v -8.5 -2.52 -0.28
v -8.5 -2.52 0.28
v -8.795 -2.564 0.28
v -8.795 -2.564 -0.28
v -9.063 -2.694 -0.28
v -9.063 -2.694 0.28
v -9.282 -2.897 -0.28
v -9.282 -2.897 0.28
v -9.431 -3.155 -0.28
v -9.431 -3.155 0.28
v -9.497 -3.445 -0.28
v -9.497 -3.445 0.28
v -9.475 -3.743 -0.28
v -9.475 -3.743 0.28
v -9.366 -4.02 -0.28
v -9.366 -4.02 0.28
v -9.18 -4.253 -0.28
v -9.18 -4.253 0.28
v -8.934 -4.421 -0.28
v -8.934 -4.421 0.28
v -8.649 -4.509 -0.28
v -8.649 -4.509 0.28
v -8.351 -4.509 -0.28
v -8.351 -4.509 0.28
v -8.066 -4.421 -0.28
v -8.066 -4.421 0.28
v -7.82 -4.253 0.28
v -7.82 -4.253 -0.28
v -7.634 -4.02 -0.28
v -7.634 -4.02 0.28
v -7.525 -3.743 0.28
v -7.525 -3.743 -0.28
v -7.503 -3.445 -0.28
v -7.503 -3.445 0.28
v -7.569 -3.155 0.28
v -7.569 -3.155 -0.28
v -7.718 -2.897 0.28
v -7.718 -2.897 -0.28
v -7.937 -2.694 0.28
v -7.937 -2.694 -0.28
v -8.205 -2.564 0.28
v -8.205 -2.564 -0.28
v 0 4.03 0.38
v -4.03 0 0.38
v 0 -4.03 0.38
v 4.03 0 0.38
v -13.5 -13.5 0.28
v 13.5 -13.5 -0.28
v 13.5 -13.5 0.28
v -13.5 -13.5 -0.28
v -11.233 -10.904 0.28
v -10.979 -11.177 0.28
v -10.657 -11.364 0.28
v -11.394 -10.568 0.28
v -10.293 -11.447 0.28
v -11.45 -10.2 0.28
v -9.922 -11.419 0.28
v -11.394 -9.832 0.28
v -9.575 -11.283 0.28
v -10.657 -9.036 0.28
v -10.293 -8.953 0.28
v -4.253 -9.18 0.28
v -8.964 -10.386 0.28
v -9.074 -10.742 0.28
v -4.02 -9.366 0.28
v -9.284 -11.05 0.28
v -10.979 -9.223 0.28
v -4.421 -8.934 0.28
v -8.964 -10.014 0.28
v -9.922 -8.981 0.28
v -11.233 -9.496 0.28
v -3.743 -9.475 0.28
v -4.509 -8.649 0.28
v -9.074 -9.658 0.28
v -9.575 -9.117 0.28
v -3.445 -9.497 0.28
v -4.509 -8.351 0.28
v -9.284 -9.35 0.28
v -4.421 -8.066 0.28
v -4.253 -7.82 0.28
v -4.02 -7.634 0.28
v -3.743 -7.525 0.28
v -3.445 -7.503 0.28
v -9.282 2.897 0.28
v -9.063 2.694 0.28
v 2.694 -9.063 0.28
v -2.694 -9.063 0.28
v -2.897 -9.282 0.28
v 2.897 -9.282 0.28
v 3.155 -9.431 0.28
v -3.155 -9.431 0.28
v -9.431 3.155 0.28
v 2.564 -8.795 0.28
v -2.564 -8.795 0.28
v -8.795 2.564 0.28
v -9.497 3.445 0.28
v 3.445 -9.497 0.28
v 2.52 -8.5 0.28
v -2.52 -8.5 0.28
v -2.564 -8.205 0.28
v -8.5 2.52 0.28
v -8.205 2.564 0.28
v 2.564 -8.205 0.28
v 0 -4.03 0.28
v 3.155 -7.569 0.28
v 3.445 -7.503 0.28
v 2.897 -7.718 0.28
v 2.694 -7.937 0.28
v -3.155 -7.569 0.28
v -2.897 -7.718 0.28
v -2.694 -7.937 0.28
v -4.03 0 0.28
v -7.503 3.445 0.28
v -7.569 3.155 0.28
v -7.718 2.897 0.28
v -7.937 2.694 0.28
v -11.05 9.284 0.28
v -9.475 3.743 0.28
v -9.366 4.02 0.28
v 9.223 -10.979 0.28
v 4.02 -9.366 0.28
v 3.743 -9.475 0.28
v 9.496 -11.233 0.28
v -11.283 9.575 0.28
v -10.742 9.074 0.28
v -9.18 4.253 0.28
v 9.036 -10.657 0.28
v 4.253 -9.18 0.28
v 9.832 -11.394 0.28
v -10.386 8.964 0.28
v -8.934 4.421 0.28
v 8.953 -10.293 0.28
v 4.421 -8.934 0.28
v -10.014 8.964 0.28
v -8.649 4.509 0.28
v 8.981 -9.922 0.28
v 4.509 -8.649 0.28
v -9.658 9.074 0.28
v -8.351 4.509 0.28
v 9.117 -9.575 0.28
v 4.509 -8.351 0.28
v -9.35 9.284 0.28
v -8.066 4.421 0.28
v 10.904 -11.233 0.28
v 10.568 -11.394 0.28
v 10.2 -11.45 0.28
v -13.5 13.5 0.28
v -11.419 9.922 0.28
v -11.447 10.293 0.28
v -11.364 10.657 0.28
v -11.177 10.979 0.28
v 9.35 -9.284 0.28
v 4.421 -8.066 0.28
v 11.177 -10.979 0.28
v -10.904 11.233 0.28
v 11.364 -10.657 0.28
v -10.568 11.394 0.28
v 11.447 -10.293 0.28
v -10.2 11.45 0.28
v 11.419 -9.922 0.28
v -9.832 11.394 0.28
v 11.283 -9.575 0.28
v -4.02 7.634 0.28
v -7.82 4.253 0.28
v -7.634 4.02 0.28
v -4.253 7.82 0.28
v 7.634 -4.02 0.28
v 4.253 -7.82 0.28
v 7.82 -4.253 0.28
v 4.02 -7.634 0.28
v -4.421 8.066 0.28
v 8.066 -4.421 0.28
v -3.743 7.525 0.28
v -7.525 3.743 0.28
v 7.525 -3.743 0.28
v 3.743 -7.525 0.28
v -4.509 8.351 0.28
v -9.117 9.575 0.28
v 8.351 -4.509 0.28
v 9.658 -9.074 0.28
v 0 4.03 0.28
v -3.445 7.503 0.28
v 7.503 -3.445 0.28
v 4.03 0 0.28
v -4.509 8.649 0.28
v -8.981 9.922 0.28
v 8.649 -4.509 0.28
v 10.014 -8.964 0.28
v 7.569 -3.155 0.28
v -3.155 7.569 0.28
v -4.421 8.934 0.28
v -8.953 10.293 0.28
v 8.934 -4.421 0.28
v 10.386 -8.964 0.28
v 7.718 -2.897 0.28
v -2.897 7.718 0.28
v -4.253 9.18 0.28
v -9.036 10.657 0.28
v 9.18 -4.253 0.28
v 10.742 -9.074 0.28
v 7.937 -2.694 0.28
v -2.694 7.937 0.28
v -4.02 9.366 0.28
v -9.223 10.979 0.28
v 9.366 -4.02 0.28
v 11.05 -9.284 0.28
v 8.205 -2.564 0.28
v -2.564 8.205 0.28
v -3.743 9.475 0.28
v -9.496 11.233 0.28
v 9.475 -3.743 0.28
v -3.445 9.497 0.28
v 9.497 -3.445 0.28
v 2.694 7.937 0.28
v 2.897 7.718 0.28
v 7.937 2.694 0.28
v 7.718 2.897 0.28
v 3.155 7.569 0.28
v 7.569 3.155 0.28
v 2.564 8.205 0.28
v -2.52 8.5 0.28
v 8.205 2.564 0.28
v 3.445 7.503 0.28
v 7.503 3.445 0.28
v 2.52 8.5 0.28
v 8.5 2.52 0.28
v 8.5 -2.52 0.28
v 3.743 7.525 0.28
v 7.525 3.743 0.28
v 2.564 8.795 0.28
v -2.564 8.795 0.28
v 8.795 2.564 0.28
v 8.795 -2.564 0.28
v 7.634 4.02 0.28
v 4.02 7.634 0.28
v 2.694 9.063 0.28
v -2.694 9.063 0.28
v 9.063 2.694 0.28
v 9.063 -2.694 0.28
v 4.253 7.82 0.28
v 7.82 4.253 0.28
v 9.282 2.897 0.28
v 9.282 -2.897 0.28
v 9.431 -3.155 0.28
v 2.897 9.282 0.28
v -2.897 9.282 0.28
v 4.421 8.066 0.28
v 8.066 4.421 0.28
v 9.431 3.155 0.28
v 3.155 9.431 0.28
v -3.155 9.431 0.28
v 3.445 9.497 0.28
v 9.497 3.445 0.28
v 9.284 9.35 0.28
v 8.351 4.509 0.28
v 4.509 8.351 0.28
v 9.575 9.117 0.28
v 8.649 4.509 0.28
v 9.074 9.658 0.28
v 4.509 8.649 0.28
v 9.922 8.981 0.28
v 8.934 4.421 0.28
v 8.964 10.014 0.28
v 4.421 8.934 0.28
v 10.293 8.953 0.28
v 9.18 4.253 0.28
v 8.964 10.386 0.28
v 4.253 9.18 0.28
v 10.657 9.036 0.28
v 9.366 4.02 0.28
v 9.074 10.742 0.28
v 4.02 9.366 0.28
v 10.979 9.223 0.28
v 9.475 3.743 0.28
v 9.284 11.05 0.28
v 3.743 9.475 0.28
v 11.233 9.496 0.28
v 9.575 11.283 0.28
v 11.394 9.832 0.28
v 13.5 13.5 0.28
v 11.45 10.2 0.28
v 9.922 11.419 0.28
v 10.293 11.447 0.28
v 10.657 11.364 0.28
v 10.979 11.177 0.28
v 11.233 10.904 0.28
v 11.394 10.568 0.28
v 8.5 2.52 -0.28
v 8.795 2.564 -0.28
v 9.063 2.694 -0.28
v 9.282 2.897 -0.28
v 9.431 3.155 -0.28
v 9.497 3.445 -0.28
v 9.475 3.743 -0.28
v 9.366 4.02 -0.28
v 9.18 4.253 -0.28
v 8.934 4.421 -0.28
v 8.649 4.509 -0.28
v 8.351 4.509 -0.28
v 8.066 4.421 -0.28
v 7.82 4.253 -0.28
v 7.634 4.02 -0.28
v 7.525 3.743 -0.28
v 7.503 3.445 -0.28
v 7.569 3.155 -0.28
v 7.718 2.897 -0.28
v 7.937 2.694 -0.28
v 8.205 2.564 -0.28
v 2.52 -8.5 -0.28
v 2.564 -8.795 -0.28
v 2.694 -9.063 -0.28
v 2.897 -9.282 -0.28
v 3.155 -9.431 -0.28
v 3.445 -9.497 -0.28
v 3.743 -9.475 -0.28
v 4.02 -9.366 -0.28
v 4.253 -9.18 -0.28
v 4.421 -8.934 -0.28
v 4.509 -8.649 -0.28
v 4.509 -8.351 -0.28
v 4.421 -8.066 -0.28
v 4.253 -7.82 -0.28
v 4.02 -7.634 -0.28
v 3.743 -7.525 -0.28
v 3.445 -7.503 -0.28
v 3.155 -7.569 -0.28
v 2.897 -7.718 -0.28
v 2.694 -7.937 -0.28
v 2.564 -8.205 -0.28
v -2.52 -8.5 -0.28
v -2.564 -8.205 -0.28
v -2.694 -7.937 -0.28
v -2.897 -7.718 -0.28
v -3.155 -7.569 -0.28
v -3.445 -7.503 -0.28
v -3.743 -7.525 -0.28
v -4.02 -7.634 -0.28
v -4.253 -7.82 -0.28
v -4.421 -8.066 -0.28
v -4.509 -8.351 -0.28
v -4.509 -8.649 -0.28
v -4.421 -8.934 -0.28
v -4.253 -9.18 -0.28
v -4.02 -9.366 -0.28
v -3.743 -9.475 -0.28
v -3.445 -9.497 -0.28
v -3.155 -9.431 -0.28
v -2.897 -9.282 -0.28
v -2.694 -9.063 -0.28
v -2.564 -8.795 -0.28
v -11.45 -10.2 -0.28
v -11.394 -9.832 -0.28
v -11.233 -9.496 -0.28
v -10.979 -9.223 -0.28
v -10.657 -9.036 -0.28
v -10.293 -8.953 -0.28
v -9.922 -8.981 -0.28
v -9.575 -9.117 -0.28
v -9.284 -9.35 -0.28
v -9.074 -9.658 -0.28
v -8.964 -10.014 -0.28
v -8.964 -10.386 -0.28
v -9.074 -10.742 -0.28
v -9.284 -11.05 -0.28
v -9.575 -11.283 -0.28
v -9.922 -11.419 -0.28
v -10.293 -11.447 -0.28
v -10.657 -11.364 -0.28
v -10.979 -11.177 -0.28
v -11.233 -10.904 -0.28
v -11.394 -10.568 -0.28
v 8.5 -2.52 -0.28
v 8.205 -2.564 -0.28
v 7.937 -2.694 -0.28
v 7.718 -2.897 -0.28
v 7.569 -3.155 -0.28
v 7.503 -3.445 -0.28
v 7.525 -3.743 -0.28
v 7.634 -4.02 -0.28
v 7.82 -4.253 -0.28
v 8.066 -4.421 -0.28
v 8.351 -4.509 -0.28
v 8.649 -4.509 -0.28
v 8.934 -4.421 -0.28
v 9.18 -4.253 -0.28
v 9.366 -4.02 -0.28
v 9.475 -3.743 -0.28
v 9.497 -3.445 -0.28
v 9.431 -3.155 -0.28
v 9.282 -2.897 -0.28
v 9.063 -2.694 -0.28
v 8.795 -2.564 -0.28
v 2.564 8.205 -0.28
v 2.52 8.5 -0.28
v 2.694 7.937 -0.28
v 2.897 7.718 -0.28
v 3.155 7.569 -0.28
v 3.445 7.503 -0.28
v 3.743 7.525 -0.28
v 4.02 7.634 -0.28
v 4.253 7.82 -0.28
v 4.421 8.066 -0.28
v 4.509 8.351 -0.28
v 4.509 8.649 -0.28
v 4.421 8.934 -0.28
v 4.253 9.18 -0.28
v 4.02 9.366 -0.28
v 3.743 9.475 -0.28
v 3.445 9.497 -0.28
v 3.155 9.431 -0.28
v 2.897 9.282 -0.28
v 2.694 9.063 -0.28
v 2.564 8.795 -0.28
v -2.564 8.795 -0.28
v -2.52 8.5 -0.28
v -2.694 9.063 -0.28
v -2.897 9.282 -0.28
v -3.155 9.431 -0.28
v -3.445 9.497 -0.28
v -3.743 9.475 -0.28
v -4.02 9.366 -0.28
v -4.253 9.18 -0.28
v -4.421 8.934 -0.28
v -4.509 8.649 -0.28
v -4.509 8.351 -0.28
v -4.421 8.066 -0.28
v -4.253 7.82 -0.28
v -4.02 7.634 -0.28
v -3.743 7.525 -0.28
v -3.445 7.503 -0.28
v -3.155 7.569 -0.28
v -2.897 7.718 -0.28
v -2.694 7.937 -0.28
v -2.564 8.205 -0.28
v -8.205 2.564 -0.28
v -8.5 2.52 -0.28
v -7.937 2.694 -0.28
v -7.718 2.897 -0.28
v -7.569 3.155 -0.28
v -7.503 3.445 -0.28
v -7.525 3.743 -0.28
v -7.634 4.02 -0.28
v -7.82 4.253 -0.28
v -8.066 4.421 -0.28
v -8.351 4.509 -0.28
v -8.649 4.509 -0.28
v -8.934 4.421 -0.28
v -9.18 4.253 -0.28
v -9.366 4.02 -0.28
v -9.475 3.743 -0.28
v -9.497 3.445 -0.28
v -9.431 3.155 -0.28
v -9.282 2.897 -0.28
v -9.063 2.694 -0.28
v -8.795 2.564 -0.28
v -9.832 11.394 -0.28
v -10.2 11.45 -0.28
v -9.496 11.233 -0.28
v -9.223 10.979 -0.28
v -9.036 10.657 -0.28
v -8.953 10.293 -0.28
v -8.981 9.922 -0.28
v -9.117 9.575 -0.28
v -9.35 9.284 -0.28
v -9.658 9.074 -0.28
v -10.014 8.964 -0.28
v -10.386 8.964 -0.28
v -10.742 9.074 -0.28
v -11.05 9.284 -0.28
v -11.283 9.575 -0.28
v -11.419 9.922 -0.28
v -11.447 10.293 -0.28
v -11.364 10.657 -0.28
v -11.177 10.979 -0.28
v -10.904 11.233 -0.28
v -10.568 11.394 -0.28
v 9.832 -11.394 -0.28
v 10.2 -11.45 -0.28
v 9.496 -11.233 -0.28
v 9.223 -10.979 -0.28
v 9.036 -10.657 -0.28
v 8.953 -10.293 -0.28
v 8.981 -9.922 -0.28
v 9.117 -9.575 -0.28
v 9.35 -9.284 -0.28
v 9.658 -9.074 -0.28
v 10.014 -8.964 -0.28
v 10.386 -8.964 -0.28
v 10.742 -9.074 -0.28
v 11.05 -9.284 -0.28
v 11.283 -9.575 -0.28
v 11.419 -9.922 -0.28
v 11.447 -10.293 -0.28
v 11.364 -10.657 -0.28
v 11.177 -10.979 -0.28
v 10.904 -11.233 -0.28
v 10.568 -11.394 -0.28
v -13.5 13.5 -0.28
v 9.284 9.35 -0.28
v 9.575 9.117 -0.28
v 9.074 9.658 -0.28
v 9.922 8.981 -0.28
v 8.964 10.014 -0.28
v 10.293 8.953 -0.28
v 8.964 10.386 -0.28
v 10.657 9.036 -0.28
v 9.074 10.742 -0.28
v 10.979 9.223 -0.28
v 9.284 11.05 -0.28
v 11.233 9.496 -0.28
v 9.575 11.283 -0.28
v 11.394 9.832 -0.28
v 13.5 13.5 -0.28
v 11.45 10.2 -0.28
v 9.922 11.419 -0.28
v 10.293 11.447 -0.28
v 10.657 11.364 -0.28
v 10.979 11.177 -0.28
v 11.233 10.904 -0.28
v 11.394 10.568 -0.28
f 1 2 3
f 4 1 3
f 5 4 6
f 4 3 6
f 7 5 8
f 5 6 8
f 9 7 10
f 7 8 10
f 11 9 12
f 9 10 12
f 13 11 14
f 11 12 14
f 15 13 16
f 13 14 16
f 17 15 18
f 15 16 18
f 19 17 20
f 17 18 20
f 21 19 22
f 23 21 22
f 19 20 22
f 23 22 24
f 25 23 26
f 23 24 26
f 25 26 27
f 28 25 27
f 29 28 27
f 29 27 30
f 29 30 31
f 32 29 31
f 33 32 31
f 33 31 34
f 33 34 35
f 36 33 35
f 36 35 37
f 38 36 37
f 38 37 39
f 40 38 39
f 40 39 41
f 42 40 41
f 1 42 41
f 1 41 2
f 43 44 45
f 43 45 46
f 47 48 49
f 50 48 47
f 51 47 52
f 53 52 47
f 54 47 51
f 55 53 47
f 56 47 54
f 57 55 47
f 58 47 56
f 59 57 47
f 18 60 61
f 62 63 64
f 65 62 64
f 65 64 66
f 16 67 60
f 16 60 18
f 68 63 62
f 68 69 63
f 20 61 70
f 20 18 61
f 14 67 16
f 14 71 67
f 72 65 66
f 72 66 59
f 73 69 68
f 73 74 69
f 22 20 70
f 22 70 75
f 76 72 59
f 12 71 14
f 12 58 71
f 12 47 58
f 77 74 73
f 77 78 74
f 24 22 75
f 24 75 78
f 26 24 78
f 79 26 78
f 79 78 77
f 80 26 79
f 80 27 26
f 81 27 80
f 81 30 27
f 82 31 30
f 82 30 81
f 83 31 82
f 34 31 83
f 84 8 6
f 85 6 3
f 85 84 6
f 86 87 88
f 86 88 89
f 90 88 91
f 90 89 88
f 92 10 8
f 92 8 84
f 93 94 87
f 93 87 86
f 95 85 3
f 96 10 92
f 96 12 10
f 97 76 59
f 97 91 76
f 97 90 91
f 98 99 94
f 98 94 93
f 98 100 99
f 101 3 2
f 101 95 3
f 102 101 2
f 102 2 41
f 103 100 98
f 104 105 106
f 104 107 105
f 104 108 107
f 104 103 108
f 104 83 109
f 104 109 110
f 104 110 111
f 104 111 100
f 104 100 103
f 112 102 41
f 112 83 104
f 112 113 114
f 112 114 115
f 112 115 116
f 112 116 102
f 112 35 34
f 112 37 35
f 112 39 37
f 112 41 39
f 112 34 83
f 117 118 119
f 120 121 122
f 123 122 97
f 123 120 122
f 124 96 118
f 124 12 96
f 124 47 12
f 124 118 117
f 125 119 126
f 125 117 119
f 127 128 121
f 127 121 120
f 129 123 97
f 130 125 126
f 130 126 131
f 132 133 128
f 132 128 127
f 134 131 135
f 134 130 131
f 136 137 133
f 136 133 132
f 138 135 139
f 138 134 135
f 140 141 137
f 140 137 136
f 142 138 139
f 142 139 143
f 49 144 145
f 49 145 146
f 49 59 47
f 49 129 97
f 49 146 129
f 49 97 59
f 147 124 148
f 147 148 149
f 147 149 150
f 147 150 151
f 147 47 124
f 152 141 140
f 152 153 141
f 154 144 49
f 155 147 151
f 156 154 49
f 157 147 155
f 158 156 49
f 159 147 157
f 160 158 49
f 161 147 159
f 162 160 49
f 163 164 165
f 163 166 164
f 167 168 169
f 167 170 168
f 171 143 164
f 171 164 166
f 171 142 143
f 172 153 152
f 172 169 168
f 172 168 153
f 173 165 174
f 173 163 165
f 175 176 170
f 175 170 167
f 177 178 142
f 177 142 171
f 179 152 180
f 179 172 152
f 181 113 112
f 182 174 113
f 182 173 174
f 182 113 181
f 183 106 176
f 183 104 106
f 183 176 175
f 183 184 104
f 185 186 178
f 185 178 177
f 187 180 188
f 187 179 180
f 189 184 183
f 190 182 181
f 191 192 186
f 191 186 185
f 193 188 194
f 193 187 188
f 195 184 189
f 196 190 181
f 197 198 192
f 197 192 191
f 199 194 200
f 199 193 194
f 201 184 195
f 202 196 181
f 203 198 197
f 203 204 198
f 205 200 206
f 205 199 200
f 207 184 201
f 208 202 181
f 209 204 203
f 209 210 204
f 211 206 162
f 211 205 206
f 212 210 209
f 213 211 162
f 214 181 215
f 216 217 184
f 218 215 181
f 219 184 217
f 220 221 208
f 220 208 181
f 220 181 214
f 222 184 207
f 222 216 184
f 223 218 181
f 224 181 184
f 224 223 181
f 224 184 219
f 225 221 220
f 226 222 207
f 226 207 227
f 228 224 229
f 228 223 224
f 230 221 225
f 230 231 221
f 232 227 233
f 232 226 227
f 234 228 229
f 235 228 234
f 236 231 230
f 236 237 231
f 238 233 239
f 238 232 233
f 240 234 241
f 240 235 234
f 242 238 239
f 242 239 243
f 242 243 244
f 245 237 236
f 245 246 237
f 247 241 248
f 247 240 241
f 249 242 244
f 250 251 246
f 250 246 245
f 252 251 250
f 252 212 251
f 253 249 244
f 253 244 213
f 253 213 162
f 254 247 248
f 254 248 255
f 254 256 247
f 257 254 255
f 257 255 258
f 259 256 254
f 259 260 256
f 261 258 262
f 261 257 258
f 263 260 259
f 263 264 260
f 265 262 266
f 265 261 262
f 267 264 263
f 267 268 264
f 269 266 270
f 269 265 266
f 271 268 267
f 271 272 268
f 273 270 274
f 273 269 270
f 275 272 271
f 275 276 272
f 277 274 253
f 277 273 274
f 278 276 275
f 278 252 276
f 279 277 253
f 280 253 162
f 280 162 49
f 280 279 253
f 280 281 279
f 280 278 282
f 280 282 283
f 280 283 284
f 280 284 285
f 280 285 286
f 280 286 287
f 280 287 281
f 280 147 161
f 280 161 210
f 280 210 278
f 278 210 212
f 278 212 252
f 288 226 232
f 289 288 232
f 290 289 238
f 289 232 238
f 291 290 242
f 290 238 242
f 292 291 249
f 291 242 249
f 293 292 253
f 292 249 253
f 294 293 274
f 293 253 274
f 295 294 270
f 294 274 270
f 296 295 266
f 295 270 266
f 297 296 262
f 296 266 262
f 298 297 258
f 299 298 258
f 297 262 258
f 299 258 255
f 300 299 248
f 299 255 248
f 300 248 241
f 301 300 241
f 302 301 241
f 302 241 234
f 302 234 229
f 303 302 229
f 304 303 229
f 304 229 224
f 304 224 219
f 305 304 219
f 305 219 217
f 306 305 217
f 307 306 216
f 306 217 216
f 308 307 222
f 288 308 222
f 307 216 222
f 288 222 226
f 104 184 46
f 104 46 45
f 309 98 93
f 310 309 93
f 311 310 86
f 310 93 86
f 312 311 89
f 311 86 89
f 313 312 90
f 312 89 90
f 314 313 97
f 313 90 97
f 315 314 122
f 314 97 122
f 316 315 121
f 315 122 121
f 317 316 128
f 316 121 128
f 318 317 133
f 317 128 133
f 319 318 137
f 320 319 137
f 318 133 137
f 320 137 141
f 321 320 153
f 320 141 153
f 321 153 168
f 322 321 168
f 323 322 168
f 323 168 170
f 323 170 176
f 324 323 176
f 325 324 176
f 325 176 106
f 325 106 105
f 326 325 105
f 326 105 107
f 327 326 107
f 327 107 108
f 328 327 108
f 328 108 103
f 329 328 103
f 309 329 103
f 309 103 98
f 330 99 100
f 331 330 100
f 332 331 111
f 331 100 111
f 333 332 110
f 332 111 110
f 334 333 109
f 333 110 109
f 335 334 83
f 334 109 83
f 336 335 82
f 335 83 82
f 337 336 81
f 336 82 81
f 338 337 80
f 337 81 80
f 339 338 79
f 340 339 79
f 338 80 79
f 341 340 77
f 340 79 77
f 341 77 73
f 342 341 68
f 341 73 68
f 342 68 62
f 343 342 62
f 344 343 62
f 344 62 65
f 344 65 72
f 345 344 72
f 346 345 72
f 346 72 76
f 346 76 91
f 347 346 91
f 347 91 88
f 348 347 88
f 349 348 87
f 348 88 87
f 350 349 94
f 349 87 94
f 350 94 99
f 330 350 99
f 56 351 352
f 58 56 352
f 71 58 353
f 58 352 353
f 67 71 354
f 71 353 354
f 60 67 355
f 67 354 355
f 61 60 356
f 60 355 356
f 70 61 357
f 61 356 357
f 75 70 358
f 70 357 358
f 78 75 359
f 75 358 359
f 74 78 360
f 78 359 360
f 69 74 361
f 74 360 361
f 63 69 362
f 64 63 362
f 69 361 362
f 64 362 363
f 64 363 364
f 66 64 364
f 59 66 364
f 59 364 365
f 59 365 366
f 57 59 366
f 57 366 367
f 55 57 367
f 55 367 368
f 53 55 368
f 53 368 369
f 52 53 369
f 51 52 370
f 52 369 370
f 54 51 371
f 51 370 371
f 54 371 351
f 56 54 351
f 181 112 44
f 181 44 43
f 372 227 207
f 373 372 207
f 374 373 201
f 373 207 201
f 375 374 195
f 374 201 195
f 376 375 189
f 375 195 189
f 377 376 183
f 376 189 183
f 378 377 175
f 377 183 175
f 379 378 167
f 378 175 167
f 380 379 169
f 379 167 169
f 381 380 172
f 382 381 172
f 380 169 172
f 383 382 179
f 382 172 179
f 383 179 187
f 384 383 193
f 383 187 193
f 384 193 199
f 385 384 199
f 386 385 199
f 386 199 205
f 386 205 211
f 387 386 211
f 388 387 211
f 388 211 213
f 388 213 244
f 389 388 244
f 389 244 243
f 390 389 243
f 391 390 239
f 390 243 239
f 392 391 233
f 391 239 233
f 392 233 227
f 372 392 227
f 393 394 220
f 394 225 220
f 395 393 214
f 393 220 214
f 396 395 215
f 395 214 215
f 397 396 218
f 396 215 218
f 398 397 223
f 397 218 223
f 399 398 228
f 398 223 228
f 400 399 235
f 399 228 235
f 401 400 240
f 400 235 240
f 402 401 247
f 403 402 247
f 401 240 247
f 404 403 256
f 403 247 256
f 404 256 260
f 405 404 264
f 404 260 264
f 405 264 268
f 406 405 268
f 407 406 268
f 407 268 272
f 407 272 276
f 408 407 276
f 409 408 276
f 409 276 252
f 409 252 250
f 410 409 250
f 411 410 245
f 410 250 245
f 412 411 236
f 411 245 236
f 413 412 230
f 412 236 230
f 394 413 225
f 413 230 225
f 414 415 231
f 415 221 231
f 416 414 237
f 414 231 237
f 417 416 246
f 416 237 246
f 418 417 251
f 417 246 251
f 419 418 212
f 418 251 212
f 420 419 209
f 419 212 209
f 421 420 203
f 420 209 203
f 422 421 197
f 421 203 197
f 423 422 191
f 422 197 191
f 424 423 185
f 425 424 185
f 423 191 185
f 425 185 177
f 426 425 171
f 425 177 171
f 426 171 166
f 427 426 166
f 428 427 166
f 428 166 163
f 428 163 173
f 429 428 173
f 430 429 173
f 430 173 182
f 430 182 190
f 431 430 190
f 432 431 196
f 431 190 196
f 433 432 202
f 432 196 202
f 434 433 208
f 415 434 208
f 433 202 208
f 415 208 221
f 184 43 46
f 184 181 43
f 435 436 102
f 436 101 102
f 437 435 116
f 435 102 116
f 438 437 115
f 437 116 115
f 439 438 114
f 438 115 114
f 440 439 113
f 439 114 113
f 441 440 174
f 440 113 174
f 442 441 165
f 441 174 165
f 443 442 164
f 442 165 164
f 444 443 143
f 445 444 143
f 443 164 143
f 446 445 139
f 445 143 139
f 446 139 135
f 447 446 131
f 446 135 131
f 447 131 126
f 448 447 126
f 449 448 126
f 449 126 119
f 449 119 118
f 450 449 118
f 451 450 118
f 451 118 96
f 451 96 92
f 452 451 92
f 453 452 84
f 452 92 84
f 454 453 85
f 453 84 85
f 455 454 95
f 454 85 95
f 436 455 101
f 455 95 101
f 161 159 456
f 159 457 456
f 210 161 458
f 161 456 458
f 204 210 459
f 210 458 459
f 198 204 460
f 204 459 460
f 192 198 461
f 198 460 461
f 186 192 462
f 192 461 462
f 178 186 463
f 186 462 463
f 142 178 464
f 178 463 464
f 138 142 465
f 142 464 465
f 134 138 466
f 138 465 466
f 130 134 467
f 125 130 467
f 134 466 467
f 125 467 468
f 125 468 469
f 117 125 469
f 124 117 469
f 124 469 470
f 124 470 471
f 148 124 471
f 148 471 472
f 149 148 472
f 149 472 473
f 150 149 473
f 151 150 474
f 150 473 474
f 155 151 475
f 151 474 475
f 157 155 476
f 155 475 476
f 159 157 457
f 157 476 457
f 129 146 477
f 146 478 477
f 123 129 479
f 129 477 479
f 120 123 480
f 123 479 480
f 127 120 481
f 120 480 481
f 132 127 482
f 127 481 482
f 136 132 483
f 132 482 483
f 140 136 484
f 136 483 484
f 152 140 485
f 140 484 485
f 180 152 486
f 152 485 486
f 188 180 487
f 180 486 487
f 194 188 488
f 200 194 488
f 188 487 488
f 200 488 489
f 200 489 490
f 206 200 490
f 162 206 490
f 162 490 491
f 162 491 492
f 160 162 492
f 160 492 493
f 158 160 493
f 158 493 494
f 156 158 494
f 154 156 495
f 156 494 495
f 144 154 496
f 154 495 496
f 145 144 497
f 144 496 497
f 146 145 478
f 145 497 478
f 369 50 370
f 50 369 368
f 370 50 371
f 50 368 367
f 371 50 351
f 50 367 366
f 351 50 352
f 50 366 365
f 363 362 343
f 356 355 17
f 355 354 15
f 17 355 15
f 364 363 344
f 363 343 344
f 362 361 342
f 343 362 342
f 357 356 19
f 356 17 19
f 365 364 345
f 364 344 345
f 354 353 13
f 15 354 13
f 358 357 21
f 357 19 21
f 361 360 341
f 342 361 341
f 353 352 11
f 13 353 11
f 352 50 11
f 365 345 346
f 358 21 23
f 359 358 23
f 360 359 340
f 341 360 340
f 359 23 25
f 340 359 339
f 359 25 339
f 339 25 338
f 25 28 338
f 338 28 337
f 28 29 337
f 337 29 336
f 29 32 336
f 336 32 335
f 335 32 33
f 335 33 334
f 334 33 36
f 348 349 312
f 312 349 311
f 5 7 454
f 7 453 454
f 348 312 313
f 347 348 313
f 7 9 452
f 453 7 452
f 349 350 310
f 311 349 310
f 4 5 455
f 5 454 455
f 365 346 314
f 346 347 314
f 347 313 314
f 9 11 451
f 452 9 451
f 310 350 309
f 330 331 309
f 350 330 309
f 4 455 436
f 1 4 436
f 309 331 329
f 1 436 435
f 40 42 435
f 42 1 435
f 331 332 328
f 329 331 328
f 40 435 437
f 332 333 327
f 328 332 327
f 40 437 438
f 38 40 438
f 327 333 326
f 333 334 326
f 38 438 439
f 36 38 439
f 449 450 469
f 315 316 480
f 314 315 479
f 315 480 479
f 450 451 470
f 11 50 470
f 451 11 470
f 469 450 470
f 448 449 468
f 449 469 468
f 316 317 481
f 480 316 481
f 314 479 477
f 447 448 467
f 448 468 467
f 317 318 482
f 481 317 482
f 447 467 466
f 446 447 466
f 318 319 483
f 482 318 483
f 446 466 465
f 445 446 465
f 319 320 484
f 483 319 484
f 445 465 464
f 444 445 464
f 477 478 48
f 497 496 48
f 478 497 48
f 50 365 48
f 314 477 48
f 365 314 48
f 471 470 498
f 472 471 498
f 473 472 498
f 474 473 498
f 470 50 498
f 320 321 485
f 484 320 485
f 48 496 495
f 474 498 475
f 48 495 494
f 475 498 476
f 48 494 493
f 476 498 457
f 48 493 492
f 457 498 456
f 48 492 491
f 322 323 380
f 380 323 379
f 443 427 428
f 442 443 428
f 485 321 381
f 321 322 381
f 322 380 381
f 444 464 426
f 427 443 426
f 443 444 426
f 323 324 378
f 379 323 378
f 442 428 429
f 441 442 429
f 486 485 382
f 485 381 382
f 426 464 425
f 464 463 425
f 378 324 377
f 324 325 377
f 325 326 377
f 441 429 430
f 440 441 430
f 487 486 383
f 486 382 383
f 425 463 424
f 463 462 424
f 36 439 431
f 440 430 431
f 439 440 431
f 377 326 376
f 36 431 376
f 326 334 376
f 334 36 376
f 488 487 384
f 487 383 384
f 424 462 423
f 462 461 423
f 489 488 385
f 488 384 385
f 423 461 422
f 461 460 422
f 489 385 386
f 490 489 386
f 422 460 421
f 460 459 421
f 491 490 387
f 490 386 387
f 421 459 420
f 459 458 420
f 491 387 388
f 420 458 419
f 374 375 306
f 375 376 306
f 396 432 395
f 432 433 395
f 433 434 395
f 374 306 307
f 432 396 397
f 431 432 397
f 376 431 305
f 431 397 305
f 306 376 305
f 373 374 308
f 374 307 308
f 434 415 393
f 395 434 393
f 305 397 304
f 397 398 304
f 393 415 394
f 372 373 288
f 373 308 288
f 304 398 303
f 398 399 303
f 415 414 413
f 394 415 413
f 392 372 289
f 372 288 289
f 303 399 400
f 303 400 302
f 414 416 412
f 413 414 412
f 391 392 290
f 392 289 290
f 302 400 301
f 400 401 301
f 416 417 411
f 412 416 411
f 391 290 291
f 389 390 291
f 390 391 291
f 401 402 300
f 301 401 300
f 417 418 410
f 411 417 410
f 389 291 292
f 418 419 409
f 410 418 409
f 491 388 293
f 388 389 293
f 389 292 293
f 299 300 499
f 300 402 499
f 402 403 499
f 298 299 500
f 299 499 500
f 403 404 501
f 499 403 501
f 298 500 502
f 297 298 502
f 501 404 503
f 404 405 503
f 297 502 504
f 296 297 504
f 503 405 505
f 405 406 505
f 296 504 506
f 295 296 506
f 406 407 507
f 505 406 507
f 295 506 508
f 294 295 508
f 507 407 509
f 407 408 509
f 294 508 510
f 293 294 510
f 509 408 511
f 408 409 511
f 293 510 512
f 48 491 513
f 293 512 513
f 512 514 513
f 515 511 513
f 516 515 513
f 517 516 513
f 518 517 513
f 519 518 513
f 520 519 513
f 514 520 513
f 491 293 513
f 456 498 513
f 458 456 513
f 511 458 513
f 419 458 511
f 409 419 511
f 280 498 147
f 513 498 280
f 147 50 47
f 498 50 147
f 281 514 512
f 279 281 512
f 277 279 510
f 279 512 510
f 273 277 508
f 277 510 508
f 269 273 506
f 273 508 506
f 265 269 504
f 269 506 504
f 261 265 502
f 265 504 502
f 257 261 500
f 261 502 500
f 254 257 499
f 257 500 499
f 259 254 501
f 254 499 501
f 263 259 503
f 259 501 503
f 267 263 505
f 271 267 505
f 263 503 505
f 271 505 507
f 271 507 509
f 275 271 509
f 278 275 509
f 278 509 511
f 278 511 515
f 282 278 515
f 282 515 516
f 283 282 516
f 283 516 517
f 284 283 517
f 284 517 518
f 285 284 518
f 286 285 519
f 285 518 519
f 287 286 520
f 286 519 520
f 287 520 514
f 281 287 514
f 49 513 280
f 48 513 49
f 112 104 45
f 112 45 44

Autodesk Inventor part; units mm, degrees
ref_plane "YZ Plane" through (0, 0, 0) normal (1, 0, 0) x (0, 1, 0)
ref_plane "XZ Plane" through (0, 0, 0) normal (0, 1, 0) x (-1, 0, 0)
ref_plane "XY Plane" through (0, 0, 0) normal (0, 0, 1) x (1, 0, 0)
sketch "Sketch1" plane through (0, 0, 0) normal (0, 0, 1) x (1, 0, 0)
  line L0 (13.5, -13.5) -> (-13.5, -13.5)
  line L1 (-13.5, -13.5) -> (-13.5, 13.5)
  line L2 (-13.5, 13.5) -> (13.5, 13.5)
  line L3 (13.5, 13.5) -> (13.5, -13.5)
  line L4 (13.5, -13.5) -> (-13.5, 13.5) construction
  line L5 (-13.5, -13.5) -> (13.5, 13.5) construction
  point P0 (0, 0)
  dimension "d0" = 27
extrude "Extrusion1" add sketch "Sketch1" along normal mid plane 0.56
sketch "Sketch2" plane through (0, 0, 0.28) normal (0, 0, 1) x (1, 0, 0)
  line L0 (-13.5, -13.5) -> (13.5, -13.5) projected
  line L1 (13.5, -13.5) -> (13.5, 13.5) projected
  line L2 (0, 0) -> (0, -13.5)
  line L3 (0, 0) -> (13.5, 0)
  point P0 (10.2, -10.2)
  dimension "d3" = 20.4
  dimension "d4" = 20.4
hole "Hole1" at (10.2, -10.2, 0.28) direction (0, 0, -1) diameter 2.5 end through all
pattern_circular "Circular Pattern1" count 4 over 360 about axis through (0, 0, -10) along (0, 0, 1) of "Hole1"
sketch "Sketch3" plane through (0, 0, 0.28) normal (0, 0, 1) x (1, 0, 0)
  circle A0 centre (-3.52, 8.5) radius 1
  point P0 (0, 0)
  dimension "d15" = 2
  dimension "d16" = 3.52
  dimension "d17" = 8.5
extrude "Extrusion2" cut sketch "Sketch3" against normal through all
mirror "Mirror1" about plane through (0, 0, 0) normal (1, 0, 0) of "Extrusion2"
pattern_circular "Circular Pattern2" count 4 over 360 about axis through (0, 0, -10) along (0, 0, 1) of "Extrusion2", "Mirror1"
ref_plane "Work Plane1" through (-3.52, 8.5, 0.28) normal (-0.9239, -0.3826, 0) x (0, 0, -1)
sketch "Sketch4" plane through (0, 0, 0.28) normal (0, 0, 1) x (1, 0, 0)
  line L0 (-4.0305, 0) -> (0, 4.0305)
  line L1 (0, 4.0305) -> (4.0305, 0)
  line L2 (4.0305, 0) -> (0, -4.0305)
  line L3 (0, -4.0305) -> (-4.0305, 0)
  line L4 (0, 4.0305) -> (0, -4.0305) construction
  line L5 (-4.0305, 0) -> (4.0305, 0) construction
  point P0 (0, 0)
  point P1 (0, 0)
  dimension "d23" = 5.7
extrude "Extrusion3" add sketch "Sketch4" along normal blind 0.1
equation "\"d4\" = d3"
properties part number "PCB"
